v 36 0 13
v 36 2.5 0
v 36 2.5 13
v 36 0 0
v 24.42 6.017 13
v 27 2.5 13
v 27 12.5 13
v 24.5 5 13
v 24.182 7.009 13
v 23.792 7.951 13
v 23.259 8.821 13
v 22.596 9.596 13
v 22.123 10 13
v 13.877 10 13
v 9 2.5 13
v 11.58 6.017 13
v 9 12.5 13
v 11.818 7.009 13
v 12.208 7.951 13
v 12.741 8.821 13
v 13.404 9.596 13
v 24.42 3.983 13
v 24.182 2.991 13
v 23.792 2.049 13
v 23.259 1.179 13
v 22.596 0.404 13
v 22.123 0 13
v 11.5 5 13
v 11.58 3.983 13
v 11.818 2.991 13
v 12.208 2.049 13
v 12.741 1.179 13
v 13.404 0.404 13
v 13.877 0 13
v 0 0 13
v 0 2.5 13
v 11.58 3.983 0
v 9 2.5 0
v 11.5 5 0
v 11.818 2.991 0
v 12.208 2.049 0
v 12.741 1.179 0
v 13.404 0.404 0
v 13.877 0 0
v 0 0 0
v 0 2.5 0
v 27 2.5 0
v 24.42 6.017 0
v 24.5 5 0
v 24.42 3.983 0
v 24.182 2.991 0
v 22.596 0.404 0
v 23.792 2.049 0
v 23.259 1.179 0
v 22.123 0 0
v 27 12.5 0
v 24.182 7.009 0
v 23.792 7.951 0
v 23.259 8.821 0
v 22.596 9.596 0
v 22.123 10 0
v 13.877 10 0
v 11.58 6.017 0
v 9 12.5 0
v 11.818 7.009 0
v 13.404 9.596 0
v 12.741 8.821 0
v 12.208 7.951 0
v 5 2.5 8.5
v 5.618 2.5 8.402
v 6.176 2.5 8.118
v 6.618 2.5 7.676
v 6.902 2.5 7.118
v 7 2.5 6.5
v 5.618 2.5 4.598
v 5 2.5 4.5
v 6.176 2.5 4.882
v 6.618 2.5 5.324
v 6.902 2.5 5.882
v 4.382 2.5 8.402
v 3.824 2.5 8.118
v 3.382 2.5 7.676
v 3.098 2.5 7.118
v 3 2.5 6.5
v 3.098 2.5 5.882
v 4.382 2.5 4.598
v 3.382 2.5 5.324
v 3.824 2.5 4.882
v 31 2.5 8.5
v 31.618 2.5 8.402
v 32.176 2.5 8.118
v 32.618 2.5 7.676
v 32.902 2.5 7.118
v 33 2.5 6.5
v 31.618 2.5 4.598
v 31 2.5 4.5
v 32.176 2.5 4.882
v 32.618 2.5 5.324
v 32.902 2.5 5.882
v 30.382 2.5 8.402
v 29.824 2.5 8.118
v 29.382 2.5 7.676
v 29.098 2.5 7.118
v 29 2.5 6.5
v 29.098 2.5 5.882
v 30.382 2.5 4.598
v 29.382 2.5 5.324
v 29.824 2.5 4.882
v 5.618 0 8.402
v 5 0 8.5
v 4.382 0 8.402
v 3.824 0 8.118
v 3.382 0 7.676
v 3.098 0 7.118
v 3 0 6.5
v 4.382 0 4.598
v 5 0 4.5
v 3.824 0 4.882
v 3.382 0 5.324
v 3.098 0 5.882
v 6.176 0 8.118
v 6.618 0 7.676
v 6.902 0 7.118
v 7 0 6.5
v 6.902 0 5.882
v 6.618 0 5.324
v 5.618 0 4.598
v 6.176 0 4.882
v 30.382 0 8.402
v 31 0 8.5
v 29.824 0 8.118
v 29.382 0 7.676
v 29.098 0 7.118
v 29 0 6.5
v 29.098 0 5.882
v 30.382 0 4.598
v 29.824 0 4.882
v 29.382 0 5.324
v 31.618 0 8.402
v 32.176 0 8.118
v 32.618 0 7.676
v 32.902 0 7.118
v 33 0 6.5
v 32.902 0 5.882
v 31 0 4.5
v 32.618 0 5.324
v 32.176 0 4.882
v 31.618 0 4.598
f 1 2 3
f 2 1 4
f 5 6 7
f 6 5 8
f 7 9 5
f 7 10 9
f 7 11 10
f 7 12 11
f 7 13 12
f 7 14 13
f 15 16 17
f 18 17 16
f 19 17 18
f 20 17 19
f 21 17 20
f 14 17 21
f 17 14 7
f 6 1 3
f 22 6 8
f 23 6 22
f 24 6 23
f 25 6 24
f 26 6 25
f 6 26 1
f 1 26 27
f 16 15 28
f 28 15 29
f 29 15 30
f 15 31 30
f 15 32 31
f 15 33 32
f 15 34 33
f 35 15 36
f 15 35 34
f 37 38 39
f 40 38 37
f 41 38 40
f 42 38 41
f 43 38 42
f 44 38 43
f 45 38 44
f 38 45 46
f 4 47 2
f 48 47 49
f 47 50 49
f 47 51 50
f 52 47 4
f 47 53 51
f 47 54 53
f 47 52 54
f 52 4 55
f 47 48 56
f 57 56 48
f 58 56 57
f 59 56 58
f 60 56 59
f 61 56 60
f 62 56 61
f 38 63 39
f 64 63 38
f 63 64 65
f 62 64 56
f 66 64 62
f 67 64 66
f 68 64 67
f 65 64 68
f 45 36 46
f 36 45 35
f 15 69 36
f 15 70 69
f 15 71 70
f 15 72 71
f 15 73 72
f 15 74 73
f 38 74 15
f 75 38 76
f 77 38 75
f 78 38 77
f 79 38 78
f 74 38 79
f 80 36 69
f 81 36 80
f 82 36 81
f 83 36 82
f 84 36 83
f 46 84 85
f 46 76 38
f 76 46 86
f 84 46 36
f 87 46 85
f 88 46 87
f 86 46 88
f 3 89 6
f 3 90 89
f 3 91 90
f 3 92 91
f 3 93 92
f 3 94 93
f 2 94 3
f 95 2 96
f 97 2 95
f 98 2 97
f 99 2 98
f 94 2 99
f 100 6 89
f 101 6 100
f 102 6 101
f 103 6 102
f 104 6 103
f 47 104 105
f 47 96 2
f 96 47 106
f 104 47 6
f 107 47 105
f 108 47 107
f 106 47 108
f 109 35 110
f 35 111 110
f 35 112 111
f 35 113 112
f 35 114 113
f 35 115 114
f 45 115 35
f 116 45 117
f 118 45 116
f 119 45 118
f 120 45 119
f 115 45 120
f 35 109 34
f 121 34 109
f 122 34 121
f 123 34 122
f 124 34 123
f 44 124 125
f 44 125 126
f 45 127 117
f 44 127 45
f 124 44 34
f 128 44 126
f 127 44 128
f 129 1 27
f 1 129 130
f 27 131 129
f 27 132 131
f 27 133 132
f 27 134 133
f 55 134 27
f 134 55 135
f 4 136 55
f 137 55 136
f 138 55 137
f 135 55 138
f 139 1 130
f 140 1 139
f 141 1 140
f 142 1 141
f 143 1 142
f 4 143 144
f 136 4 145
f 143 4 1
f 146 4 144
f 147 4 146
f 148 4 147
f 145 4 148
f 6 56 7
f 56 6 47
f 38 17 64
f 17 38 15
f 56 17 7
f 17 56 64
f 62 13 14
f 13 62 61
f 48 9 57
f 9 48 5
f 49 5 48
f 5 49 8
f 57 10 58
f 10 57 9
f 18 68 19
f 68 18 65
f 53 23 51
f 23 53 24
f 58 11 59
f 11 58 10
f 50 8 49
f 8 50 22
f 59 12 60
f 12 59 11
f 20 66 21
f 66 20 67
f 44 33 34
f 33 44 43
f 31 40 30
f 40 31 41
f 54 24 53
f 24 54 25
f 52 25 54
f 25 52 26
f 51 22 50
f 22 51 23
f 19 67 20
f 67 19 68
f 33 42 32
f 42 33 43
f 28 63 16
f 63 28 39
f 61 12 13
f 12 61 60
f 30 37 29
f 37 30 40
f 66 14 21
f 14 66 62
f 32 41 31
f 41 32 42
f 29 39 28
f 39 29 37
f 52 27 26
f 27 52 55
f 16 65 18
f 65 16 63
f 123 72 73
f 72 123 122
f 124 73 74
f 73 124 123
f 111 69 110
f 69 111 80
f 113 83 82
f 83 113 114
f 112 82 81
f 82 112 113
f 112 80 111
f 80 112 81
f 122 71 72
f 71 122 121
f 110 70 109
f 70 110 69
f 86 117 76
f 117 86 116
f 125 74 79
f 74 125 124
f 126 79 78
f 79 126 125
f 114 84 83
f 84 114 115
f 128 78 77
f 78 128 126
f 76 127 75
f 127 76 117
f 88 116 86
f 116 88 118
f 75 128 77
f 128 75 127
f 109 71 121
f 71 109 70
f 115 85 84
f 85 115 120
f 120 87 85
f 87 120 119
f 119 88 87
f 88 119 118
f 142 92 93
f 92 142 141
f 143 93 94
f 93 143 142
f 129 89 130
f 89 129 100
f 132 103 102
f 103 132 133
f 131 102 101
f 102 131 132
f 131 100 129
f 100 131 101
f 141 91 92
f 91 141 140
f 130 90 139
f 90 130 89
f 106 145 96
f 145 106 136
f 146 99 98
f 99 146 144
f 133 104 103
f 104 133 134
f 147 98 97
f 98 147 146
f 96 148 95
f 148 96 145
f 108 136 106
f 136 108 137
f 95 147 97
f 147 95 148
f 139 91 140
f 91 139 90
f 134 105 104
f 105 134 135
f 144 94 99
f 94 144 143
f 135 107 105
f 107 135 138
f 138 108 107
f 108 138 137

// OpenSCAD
//oco para o motor
module oco(){
intersection(){
cube([20,10,13]);
translate([10,5,0])
	cylinder(r=6.5,h=13,$fn=40);
}
}


difference(){
//soporte
union(){
//base
	cube([36,2.5,13]);
//cubo		
	translate([9,2.5,0])cube ([18,10,13]);
}

translate ([8,0,0]) #oco();

//oco parafuso
translate([5,4,6.5])
rotate([90,0,0])
cylinder (r=2, h=10,$fn=20);

//oco parafuso
translate([31,4,6.5])
rotate([90,0,0])
cylinder (r=2, h=10,$fn=20);

}
